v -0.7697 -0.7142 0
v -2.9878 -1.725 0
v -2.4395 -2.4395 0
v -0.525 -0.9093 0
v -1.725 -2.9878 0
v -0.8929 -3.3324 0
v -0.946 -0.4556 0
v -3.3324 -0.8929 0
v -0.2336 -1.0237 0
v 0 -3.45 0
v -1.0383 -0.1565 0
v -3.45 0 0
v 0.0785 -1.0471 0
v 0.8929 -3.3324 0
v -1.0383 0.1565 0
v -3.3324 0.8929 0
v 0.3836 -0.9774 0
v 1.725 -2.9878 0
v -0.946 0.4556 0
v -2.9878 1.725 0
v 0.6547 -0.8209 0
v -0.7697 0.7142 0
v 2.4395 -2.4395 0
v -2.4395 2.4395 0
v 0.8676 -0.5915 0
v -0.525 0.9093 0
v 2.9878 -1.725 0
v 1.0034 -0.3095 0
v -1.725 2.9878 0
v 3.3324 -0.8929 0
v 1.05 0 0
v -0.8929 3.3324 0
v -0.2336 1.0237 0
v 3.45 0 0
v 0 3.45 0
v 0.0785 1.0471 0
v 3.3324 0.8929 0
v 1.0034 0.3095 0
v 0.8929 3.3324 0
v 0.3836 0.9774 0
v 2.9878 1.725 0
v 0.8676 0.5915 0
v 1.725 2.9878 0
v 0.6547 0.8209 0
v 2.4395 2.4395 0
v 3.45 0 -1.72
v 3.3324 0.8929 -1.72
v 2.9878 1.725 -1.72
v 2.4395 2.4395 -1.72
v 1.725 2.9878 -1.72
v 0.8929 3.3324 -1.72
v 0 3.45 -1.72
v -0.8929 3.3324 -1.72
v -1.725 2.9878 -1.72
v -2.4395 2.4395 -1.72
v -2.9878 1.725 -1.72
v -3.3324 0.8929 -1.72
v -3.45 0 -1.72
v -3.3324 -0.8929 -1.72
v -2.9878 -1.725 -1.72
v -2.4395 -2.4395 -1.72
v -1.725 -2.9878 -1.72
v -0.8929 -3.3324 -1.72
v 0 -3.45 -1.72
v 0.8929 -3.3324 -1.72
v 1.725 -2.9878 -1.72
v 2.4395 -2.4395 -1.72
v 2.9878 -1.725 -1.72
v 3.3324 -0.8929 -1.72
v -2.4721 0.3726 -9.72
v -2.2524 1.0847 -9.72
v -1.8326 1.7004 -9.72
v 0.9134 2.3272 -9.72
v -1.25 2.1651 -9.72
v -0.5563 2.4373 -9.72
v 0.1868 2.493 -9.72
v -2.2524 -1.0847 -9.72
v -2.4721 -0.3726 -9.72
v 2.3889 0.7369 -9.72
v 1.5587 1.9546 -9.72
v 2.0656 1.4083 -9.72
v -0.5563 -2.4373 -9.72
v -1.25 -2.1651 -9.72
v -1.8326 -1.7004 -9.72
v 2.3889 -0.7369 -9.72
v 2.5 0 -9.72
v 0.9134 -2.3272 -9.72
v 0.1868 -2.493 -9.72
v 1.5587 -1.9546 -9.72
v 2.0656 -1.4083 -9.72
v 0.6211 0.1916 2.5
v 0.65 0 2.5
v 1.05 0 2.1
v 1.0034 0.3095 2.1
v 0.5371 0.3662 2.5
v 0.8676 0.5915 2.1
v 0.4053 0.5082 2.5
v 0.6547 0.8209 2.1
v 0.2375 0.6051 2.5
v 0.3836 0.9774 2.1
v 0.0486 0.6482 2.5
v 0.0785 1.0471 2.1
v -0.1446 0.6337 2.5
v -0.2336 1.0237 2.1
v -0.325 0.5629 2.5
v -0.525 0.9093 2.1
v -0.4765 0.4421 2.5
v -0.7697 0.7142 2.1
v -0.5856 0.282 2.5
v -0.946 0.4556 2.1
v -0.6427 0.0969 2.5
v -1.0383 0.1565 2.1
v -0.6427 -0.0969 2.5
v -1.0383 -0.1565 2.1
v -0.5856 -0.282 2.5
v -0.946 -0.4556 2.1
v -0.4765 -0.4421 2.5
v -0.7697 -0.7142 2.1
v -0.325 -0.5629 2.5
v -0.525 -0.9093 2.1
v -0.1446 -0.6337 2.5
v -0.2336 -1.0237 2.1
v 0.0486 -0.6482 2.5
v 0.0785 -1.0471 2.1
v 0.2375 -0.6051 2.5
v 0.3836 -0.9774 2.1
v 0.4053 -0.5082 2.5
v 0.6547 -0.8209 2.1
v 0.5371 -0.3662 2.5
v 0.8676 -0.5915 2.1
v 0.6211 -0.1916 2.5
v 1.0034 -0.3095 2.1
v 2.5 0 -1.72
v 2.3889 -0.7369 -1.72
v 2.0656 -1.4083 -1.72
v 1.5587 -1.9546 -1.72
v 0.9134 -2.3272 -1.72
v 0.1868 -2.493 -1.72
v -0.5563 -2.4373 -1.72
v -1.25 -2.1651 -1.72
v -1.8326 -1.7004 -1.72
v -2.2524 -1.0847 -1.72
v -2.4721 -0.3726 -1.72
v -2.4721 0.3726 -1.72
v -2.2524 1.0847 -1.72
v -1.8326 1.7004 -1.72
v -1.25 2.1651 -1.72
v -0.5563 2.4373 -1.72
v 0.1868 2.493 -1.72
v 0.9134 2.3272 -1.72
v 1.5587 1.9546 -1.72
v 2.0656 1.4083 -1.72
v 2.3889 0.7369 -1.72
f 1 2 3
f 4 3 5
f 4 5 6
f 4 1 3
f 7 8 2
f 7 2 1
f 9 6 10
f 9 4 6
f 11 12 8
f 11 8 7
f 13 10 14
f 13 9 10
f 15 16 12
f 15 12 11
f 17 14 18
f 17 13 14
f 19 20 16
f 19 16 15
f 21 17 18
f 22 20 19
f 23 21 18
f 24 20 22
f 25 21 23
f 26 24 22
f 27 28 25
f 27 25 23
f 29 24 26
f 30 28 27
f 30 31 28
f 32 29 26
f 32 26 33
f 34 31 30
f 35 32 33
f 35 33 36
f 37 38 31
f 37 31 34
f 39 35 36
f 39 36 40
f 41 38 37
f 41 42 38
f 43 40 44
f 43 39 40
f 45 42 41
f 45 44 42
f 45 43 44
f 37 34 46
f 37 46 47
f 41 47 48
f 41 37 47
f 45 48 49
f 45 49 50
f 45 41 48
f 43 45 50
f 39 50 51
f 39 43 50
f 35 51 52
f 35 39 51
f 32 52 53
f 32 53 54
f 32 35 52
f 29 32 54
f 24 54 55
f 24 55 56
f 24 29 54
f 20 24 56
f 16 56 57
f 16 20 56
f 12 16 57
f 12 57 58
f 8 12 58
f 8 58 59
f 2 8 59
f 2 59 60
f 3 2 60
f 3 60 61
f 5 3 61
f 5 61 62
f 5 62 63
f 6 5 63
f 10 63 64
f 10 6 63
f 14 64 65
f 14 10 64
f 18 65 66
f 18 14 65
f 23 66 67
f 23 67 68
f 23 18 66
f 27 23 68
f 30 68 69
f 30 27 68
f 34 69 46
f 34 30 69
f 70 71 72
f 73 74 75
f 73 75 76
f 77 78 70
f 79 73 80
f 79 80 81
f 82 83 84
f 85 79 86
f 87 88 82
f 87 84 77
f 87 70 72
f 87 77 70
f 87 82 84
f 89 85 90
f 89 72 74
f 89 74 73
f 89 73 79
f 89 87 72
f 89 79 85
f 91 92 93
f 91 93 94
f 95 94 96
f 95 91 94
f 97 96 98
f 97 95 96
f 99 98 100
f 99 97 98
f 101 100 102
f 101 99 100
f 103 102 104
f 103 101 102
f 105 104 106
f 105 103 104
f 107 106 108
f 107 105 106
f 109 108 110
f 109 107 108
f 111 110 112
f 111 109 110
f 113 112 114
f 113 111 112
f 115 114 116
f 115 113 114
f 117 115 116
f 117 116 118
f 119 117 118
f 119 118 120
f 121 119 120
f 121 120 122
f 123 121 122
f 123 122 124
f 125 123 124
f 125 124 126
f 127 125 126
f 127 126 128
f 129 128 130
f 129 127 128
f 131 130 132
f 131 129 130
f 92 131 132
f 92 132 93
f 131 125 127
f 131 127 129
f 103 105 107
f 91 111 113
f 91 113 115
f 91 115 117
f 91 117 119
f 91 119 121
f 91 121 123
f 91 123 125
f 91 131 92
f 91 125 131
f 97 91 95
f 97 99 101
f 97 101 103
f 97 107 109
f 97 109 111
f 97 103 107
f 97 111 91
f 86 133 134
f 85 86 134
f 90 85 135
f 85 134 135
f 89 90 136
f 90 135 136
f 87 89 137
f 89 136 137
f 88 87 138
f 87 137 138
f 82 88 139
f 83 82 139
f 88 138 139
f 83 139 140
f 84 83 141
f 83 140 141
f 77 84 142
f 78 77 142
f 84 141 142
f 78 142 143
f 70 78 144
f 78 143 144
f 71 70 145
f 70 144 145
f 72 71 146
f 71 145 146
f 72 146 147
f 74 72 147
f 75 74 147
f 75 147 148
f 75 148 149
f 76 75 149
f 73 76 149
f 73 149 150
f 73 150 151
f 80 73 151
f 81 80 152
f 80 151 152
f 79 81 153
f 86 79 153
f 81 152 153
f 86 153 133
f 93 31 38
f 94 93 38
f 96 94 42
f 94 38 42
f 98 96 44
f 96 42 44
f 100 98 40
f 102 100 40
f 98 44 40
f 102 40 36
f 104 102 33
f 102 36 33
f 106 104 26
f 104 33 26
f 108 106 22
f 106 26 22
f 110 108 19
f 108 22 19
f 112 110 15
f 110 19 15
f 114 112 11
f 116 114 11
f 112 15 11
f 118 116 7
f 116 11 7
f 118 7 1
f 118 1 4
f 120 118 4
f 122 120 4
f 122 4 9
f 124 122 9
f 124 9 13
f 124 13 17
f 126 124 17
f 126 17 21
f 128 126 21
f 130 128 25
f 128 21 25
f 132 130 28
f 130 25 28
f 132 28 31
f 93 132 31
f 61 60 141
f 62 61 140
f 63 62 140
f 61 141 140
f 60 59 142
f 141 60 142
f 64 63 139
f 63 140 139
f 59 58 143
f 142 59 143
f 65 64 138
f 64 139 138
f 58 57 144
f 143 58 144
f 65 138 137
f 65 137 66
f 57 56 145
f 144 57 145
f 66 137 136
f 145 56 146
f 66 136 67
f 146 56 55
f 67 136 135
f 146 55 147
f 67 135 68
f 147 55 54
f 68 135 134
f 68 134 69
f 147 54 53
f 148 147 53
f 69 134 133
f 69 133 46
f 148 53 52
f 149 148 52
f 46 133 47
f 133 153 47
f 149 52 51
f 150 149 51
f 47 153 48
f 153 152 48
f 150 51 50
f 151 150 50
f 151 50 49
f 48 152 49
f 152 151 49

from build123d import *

# Parameters (mm, degrees)
SKETCH1_R           = 3.45
BOSS_EXTRUDE1_DEPTH = 1.72
SKETCH2_R           = 2.5
BOSS_EXTRUDE2_DEPTH = 8
SKETCH3_R           = 1.05
BOSS_EXTRUDE3_DEPTH = 2.5
CHAMFER1_SIZE       = 0.4


with BuildPart() as part:
    # Sketch1 → Boss-Extrude1 (new body)
    with BuildSketch(Plane.XY):
        Circle(SKETCH1_R)
    extrude(amount=-BOSS_EXTRUDE1_DEPTH)

    # Sketch2 → Boss-Extrude2 (add)
    with BuildSketch(Plane(origin=(0, 0, -1.72), x_dir=(-1, 0, 0), z_dir=(0, 0, -1))):
        with Locations(Location((0, 0, 0), (0, 0, 180))):
            Circle(SKETCH2_R)
    extrude(amount=BOSS_EXTRUDE2_DEPTH)

    # Sketch3 → Boss-Extrude3 (add)
    with BuildSketch(Plane.XY):
        Circle(SKETCH3_R)
    extrude(amount=BOSS_EXTRUDE3_DEPTH)

    # Chamfer1
    chamfer1_edges = [part.edges().sort_by_distance(p)[0] for p in [
        (-1.05, 0, 2.5),
    ]]
    chamfer(chamfer1_edges, length=CHAMFER1_SIZE)


solid = part.part
